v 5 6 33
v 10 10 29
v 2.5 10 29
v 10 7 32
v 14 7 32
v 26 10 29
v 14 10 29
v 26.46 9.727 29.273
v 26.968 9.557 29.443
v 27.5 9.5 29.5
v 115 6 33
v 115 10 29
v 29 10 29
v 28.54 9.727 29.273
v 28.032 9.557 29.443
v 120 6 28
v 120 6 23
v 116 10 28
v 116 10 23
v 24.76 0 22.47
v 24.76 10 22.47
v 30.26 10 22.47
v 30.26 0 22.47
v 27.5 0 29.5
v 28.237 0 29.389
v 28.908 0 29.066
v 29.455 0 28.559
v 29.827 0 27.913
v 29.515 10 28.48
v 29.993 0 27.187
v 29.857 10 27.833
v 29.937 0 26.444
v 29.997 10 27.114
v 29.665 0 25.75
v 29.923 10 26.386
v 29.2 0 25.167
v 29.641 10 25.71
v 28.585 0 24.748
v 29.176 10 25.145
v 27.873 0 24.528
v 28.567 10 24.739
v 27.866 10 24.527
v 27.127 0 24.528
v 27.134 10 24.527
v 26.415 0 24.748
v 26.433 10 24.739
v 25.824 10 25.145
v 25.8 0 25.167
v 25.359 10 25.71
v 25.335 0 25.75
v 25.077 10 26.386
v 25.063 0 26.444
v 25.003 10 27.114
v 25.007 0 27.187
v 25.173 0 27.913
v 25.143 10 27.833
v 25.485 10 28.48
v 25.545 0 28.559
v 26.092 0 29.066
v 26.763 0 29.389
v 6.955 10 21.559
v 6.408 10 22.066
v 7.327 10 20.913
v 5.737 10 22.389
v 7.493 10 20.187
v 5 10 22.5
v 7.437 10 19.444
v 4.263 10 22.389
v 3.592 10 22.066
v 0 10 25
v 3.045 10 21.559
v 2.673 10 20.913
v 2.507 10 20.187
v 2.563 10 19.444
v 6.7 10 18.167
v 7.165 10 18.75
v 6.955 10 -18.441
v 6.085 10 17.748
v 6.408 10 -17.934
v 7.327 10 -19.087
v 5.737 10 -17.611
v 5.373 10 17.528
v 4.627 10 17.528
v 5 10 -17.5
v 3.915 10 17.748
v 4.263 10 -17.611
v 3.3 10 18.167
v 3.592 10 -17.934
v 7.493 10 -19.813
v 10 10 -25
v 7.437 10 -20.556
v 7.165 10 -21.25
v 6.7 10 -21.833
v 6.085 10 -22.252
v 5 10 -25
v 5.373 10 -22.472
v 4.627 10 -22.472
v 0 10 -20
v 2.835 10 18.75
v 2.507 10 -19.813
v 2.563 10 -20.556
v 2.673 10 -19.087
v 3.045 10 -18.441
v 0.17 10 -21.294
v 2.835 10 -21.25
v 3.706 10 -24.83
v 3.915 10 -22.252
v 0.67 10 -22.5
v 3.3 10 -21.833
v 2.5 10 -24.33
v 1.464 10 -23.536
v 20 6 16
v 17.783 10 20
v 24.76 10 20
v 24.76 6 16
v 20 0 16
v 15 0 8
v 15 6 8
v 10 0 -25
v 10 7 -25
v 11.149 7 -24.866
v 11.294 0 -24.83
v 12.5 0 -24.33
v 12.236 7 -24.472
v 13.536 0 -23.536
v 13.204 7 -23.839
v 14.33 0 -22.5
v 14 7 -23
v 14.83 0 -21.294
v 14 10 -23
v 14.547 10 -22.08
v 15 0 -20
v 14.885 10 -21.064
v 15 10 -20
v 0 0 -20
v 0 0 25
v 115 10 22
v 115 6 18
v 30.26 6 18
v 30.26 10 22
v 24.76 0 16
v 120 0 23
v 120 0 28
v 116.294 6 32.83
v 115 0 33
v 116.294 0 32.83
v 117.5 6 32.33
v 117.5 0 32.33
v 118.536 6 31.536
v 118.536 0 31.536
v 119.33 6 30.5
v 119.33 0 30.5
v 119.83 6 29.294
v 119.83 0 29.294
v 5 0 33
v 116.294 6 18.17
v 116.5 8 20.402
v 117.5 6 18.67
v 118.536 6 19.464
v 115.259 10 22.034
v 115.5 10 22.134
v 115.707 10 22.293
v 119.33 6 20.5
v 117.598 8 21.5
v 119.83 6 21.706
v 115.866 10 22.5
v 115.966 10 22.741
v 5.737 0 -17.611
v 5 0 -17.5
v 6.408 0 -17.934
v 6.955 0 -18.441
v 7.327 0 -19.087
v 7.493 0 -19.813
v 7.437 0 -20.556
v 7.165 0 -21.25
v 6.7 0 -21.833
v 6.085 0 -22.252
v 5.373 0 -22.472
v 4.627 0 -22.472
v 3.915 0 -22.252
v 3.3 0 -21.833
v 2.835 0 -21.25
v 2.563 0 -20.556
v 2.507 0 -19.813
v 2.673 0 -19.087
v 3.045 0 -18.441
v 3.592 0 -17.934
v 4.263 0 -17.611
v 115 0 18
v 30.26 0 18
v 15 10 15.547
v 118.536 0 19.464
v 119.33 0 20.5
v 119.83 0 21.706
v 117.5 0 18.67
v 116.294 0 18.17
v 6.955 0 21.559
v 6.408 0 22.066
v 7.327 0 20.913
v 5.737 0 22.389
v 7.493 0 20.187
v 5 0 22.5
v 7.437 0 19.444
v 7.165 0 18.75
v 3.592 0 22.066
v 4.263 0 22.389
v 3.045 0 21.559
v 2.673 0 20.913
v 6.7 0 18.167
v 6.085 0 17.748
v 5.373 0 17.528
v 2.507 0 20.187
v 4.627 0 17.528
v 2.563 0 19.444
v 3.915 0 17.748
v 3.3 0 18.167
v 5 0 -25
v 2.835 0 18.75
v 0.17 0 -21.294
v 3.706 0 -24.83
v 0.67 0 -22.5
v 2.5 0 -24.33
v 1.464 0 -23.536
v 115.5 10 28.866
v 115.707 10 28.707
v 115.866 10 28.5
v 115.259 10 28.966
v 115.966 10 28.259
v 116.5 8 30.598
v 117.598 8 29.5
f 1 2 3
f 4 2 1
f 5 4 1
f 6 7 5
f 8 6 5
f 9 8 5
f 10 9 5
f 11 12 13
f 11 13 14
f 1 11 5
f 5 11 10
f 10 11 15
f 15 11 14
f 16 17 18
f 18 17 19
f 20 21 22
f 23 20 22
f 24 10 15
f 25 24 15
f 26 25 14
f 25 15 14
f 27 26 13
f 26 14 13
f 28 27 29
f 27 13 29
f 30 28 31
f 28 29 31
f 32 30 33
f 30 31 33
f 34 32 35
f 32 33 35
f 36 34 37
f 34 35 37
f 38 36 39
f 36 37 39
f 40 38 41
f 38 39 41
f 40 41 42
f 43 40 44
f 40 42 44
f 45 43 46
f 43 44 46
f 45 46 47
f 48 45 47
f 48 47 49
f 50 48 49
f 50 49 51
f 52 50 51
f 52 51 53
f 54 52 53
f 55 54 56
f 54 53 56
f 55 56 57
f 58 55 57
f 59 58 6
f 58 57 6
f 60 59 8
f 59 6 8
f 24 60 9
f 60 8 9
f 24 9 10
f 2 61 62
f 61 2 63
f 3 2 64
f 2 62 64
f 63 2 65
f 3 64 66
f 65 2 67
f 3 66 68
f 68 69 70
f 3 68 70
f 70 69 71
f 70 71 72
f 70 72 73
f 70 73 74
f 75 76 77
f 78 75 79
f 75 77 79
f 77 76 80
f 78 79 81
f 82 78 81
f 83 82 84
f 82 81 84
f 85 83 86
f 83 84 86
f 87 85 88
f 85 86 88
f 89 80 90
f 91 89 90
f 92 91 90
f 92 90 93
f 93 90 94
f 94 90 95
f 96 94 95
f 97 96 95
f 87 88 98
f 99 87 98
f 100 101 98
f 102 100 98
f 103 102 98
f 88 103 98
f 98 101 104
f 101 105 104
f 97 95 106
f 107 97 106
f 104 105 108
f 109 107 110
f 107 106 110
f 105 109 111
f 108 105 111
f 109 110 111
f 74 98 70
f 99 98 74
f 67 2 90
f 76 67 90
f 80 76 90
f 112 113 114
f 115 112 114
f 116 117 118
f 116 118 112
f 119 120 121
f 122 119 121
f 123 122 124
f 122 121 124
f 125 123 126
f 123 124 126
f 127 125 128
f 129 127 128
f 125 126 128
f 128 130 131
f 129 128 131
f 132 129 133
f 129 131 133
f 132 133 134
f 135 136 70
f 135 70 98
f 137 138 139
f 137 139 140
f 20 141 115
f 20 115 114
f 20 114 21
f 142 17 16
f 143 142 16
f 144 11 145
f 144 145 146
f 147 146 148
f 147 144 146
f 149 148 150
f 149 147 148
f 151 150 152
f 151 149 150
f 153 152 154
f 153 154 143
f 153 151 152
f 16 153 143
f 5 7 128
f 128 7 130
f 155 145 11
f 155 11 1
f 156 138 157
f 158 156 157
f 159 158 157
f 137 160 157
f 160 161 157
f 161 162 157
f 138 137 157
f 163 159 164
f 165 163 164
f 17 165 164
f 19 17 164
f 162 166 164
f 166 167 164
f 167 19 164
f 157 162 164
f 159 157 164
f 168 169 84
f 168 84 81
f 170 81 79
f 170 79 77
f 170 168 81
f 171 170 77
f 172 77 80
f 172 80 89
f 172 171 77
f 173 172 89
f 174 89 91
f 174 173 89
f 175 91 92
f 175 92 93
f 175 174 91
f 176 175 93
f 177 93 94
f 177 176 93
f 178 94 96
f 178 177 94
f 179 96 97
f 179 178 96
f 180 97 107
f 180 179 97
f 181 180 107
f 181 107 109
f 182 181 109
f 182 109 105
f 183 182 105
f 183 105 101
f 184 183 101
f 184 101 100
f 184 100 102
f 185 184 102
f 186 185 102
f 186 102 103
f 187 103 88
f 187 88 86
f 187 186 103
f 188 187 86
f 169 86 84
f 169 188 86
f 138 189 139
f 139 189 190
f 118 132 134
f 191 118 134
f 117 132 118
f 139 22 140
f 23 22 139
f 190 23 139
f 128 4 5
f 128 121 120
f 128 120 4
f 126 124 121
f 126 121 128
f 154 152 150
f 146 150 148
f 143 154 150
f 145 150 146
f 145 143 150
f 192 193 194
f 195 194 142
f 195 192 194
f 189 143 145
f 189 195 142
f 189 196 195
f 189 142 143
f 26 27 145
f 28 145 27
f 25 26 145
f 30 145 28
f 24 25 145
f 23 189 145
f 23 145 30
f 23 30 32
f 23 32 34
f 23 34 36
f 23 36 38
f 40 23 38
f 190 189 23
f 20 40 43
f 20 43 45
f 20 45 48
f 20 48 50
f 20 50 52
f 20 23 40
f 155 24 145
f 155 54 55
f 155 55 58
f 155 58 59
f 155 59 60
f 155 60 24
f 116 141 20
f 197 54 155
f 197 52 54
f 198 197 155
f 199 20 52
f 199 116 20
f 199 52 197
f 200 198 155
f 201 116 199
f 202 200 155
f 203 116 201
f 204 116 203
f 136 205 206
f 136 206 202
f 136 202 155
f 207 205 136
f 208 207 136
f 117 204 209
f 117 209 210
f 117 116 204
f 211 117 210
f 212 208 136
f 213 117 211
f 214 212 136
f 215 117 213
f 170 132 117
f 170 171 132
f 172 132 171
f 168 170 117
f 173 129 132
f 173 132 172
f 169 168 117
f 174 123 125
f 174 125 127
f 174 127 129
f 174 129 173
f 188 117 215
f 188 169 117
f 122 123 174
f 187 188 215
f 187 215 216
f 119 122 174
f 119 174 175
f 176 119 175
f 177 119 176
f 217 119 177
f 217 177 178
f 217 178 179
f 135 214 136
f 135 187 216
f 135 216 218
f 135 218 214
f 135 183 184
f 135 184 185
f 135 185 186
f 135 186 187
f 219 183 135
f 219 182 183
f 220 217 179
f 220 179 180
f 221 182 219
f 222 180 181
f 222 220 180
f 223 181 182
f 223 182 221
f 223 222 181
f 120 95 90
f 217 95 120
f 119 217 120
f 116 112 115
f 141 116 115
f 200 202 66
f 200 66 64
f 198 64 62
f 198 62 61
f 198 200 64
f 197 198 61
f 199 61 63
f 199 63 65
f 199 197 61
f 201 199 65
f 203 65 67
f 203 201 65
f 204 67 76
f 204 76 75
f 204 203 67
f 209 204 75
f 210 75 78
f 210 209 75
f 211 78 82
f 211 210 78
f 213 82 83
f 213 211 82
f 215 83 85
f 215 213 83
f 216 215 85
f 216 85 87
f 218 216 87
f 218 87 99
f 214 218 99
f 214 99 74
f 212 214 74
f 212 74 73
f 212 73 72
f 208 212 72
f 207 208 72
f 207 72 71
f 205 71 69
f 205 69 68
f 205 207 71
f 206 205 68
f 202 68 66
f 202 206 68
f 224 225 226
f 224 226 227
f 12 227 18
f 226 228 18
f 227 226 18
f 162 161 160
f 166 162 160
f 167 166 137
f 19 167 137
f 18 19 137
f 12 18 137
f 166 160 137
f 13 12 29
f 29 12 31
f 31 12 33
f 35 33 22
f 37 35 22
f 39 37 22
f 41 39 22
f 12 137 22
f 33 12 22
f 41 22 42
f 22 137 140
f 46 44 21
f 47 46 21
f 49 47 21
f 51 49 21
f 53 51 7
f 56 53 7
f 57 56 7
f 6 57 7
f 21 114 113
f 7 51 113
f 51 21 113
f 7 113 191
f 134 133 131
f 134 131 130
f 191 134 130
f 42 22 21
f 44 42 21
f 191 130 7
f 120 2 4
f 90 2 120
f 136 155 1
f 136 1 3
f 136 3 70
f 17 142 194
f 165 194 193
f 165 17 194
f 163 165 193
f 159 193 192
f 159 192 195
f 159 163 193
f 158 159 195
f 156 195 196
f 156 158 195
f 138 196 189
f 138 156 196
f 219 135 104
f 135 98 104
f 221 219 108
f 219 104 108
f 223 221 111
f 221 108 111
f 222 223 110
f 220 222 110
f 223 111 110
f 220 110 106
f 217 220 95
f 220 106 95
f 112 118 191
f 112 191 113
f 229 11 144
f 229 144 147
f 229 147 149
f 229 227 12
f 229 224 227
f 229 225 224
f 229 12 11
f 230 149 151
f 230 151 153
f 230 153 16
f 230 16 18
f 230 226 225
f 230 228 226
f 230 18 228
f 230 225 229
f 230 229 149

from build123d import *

# Parameters (mm, degrees)
SKETCH1_R           = 2.5
BOSS_EXTRUDE1_DEPTH = 10
SKETCH2_W           = 4
SKETCH2_H           = 61.321004691
CUT_EXTRUDE1_DEPTH  = 3
FILLET1_R           = 5
CHAMFER2_SIZE       = 4
CHAMFER3_SIZE       = 4
SKETCH3_R           = 2.5
CUT_EXTRUDE2_DEPTH  = 10


with BuildPart() as part:
    # Sketch1 → Boss-Extrude1 (new body)
    with BuildSketch(Plane(origin=(0, 0, 0), x_dir=(1, 0, 0), z_dir=(0, 1, 0))):
        Polygon((0, -25), (0, 25), (15, 25), (15, -8), (20, -16), (24.76, -16), (24.76, -22.47), (30.26, -22.47), (30.26, -18), (35, -18), (120, -18), (120, -33), (5, -33), align=None)
        with Locations((5, 20)):
            Circle(SKETCH1_R, mode=Mode.SUBTRACT)
        with Locations((5, -20)):
            Circle(SKETCH1_R, mode=Mode.SUBTRACT)
    extrude(amount=BOSS_EXTRUDE1_DEPTH)

    # Sketch2 → Cut-Extrude1 (cut)
    with BuildSketch(Plane(origin=(0, 10, 0), x_dir=(1, 0, 0), z_dir=(0, 1, 0))):
        with Locations((12, -5.660502345)):
            Rectangle(SKETCH2_W, SKETCH2_H)
    extrude(amount=-CUT_EXTRUDE1_DEPTH, mode=Mode.SUBTRACT)

    # Fillet1
    fillet1_edges = [part.edges().sort_by_distance(p)[0] for p in [
        (120, 5, 33),
        (120, 5, 18),
        (0, 5, -25),
        (15, 5, -25),
    ]]
    fillet(fillet1_edges, radius=FILLET1_R)

    # Chamfer2
    chamfer2_edges = [part.edges().sort_by_distance(p)[0] for p in [
        (118.535533906, 10, 31.535533906),
        (120, 10, 25.5),
        (118.535533906, 10, 19.464466094),
        (72.63, 10, 18),
        (64.5, 10, 33),
    ]]
    chamfer(chamfer2_edges, length=CHAMFER2_SIZE)

    # Chamfer3
    chamfer3_edges = [part.edges().sort_by_distance(p)[0] for p in [
        (22.38, 10, 16),
        (17.5, 10, 12),
    ]]
    chamfer(chamfer3_edges, length=CHAMFER3_SIZE)

    # Sketch3 → Cut-Extrude2 (cut)
    with BuildSketch(Plane(origin=(0, 10, 0), x_dir=(1, 0, 0), z_dir=(0, 1, 0))):
        with Locations((27.5, -27)):
            Circle(SKETCH3_R)
    extrude(amount=-CUT_EXTRUDE2_DEPTH, mode=Mode.SUBTRACT)


solid = part.part
